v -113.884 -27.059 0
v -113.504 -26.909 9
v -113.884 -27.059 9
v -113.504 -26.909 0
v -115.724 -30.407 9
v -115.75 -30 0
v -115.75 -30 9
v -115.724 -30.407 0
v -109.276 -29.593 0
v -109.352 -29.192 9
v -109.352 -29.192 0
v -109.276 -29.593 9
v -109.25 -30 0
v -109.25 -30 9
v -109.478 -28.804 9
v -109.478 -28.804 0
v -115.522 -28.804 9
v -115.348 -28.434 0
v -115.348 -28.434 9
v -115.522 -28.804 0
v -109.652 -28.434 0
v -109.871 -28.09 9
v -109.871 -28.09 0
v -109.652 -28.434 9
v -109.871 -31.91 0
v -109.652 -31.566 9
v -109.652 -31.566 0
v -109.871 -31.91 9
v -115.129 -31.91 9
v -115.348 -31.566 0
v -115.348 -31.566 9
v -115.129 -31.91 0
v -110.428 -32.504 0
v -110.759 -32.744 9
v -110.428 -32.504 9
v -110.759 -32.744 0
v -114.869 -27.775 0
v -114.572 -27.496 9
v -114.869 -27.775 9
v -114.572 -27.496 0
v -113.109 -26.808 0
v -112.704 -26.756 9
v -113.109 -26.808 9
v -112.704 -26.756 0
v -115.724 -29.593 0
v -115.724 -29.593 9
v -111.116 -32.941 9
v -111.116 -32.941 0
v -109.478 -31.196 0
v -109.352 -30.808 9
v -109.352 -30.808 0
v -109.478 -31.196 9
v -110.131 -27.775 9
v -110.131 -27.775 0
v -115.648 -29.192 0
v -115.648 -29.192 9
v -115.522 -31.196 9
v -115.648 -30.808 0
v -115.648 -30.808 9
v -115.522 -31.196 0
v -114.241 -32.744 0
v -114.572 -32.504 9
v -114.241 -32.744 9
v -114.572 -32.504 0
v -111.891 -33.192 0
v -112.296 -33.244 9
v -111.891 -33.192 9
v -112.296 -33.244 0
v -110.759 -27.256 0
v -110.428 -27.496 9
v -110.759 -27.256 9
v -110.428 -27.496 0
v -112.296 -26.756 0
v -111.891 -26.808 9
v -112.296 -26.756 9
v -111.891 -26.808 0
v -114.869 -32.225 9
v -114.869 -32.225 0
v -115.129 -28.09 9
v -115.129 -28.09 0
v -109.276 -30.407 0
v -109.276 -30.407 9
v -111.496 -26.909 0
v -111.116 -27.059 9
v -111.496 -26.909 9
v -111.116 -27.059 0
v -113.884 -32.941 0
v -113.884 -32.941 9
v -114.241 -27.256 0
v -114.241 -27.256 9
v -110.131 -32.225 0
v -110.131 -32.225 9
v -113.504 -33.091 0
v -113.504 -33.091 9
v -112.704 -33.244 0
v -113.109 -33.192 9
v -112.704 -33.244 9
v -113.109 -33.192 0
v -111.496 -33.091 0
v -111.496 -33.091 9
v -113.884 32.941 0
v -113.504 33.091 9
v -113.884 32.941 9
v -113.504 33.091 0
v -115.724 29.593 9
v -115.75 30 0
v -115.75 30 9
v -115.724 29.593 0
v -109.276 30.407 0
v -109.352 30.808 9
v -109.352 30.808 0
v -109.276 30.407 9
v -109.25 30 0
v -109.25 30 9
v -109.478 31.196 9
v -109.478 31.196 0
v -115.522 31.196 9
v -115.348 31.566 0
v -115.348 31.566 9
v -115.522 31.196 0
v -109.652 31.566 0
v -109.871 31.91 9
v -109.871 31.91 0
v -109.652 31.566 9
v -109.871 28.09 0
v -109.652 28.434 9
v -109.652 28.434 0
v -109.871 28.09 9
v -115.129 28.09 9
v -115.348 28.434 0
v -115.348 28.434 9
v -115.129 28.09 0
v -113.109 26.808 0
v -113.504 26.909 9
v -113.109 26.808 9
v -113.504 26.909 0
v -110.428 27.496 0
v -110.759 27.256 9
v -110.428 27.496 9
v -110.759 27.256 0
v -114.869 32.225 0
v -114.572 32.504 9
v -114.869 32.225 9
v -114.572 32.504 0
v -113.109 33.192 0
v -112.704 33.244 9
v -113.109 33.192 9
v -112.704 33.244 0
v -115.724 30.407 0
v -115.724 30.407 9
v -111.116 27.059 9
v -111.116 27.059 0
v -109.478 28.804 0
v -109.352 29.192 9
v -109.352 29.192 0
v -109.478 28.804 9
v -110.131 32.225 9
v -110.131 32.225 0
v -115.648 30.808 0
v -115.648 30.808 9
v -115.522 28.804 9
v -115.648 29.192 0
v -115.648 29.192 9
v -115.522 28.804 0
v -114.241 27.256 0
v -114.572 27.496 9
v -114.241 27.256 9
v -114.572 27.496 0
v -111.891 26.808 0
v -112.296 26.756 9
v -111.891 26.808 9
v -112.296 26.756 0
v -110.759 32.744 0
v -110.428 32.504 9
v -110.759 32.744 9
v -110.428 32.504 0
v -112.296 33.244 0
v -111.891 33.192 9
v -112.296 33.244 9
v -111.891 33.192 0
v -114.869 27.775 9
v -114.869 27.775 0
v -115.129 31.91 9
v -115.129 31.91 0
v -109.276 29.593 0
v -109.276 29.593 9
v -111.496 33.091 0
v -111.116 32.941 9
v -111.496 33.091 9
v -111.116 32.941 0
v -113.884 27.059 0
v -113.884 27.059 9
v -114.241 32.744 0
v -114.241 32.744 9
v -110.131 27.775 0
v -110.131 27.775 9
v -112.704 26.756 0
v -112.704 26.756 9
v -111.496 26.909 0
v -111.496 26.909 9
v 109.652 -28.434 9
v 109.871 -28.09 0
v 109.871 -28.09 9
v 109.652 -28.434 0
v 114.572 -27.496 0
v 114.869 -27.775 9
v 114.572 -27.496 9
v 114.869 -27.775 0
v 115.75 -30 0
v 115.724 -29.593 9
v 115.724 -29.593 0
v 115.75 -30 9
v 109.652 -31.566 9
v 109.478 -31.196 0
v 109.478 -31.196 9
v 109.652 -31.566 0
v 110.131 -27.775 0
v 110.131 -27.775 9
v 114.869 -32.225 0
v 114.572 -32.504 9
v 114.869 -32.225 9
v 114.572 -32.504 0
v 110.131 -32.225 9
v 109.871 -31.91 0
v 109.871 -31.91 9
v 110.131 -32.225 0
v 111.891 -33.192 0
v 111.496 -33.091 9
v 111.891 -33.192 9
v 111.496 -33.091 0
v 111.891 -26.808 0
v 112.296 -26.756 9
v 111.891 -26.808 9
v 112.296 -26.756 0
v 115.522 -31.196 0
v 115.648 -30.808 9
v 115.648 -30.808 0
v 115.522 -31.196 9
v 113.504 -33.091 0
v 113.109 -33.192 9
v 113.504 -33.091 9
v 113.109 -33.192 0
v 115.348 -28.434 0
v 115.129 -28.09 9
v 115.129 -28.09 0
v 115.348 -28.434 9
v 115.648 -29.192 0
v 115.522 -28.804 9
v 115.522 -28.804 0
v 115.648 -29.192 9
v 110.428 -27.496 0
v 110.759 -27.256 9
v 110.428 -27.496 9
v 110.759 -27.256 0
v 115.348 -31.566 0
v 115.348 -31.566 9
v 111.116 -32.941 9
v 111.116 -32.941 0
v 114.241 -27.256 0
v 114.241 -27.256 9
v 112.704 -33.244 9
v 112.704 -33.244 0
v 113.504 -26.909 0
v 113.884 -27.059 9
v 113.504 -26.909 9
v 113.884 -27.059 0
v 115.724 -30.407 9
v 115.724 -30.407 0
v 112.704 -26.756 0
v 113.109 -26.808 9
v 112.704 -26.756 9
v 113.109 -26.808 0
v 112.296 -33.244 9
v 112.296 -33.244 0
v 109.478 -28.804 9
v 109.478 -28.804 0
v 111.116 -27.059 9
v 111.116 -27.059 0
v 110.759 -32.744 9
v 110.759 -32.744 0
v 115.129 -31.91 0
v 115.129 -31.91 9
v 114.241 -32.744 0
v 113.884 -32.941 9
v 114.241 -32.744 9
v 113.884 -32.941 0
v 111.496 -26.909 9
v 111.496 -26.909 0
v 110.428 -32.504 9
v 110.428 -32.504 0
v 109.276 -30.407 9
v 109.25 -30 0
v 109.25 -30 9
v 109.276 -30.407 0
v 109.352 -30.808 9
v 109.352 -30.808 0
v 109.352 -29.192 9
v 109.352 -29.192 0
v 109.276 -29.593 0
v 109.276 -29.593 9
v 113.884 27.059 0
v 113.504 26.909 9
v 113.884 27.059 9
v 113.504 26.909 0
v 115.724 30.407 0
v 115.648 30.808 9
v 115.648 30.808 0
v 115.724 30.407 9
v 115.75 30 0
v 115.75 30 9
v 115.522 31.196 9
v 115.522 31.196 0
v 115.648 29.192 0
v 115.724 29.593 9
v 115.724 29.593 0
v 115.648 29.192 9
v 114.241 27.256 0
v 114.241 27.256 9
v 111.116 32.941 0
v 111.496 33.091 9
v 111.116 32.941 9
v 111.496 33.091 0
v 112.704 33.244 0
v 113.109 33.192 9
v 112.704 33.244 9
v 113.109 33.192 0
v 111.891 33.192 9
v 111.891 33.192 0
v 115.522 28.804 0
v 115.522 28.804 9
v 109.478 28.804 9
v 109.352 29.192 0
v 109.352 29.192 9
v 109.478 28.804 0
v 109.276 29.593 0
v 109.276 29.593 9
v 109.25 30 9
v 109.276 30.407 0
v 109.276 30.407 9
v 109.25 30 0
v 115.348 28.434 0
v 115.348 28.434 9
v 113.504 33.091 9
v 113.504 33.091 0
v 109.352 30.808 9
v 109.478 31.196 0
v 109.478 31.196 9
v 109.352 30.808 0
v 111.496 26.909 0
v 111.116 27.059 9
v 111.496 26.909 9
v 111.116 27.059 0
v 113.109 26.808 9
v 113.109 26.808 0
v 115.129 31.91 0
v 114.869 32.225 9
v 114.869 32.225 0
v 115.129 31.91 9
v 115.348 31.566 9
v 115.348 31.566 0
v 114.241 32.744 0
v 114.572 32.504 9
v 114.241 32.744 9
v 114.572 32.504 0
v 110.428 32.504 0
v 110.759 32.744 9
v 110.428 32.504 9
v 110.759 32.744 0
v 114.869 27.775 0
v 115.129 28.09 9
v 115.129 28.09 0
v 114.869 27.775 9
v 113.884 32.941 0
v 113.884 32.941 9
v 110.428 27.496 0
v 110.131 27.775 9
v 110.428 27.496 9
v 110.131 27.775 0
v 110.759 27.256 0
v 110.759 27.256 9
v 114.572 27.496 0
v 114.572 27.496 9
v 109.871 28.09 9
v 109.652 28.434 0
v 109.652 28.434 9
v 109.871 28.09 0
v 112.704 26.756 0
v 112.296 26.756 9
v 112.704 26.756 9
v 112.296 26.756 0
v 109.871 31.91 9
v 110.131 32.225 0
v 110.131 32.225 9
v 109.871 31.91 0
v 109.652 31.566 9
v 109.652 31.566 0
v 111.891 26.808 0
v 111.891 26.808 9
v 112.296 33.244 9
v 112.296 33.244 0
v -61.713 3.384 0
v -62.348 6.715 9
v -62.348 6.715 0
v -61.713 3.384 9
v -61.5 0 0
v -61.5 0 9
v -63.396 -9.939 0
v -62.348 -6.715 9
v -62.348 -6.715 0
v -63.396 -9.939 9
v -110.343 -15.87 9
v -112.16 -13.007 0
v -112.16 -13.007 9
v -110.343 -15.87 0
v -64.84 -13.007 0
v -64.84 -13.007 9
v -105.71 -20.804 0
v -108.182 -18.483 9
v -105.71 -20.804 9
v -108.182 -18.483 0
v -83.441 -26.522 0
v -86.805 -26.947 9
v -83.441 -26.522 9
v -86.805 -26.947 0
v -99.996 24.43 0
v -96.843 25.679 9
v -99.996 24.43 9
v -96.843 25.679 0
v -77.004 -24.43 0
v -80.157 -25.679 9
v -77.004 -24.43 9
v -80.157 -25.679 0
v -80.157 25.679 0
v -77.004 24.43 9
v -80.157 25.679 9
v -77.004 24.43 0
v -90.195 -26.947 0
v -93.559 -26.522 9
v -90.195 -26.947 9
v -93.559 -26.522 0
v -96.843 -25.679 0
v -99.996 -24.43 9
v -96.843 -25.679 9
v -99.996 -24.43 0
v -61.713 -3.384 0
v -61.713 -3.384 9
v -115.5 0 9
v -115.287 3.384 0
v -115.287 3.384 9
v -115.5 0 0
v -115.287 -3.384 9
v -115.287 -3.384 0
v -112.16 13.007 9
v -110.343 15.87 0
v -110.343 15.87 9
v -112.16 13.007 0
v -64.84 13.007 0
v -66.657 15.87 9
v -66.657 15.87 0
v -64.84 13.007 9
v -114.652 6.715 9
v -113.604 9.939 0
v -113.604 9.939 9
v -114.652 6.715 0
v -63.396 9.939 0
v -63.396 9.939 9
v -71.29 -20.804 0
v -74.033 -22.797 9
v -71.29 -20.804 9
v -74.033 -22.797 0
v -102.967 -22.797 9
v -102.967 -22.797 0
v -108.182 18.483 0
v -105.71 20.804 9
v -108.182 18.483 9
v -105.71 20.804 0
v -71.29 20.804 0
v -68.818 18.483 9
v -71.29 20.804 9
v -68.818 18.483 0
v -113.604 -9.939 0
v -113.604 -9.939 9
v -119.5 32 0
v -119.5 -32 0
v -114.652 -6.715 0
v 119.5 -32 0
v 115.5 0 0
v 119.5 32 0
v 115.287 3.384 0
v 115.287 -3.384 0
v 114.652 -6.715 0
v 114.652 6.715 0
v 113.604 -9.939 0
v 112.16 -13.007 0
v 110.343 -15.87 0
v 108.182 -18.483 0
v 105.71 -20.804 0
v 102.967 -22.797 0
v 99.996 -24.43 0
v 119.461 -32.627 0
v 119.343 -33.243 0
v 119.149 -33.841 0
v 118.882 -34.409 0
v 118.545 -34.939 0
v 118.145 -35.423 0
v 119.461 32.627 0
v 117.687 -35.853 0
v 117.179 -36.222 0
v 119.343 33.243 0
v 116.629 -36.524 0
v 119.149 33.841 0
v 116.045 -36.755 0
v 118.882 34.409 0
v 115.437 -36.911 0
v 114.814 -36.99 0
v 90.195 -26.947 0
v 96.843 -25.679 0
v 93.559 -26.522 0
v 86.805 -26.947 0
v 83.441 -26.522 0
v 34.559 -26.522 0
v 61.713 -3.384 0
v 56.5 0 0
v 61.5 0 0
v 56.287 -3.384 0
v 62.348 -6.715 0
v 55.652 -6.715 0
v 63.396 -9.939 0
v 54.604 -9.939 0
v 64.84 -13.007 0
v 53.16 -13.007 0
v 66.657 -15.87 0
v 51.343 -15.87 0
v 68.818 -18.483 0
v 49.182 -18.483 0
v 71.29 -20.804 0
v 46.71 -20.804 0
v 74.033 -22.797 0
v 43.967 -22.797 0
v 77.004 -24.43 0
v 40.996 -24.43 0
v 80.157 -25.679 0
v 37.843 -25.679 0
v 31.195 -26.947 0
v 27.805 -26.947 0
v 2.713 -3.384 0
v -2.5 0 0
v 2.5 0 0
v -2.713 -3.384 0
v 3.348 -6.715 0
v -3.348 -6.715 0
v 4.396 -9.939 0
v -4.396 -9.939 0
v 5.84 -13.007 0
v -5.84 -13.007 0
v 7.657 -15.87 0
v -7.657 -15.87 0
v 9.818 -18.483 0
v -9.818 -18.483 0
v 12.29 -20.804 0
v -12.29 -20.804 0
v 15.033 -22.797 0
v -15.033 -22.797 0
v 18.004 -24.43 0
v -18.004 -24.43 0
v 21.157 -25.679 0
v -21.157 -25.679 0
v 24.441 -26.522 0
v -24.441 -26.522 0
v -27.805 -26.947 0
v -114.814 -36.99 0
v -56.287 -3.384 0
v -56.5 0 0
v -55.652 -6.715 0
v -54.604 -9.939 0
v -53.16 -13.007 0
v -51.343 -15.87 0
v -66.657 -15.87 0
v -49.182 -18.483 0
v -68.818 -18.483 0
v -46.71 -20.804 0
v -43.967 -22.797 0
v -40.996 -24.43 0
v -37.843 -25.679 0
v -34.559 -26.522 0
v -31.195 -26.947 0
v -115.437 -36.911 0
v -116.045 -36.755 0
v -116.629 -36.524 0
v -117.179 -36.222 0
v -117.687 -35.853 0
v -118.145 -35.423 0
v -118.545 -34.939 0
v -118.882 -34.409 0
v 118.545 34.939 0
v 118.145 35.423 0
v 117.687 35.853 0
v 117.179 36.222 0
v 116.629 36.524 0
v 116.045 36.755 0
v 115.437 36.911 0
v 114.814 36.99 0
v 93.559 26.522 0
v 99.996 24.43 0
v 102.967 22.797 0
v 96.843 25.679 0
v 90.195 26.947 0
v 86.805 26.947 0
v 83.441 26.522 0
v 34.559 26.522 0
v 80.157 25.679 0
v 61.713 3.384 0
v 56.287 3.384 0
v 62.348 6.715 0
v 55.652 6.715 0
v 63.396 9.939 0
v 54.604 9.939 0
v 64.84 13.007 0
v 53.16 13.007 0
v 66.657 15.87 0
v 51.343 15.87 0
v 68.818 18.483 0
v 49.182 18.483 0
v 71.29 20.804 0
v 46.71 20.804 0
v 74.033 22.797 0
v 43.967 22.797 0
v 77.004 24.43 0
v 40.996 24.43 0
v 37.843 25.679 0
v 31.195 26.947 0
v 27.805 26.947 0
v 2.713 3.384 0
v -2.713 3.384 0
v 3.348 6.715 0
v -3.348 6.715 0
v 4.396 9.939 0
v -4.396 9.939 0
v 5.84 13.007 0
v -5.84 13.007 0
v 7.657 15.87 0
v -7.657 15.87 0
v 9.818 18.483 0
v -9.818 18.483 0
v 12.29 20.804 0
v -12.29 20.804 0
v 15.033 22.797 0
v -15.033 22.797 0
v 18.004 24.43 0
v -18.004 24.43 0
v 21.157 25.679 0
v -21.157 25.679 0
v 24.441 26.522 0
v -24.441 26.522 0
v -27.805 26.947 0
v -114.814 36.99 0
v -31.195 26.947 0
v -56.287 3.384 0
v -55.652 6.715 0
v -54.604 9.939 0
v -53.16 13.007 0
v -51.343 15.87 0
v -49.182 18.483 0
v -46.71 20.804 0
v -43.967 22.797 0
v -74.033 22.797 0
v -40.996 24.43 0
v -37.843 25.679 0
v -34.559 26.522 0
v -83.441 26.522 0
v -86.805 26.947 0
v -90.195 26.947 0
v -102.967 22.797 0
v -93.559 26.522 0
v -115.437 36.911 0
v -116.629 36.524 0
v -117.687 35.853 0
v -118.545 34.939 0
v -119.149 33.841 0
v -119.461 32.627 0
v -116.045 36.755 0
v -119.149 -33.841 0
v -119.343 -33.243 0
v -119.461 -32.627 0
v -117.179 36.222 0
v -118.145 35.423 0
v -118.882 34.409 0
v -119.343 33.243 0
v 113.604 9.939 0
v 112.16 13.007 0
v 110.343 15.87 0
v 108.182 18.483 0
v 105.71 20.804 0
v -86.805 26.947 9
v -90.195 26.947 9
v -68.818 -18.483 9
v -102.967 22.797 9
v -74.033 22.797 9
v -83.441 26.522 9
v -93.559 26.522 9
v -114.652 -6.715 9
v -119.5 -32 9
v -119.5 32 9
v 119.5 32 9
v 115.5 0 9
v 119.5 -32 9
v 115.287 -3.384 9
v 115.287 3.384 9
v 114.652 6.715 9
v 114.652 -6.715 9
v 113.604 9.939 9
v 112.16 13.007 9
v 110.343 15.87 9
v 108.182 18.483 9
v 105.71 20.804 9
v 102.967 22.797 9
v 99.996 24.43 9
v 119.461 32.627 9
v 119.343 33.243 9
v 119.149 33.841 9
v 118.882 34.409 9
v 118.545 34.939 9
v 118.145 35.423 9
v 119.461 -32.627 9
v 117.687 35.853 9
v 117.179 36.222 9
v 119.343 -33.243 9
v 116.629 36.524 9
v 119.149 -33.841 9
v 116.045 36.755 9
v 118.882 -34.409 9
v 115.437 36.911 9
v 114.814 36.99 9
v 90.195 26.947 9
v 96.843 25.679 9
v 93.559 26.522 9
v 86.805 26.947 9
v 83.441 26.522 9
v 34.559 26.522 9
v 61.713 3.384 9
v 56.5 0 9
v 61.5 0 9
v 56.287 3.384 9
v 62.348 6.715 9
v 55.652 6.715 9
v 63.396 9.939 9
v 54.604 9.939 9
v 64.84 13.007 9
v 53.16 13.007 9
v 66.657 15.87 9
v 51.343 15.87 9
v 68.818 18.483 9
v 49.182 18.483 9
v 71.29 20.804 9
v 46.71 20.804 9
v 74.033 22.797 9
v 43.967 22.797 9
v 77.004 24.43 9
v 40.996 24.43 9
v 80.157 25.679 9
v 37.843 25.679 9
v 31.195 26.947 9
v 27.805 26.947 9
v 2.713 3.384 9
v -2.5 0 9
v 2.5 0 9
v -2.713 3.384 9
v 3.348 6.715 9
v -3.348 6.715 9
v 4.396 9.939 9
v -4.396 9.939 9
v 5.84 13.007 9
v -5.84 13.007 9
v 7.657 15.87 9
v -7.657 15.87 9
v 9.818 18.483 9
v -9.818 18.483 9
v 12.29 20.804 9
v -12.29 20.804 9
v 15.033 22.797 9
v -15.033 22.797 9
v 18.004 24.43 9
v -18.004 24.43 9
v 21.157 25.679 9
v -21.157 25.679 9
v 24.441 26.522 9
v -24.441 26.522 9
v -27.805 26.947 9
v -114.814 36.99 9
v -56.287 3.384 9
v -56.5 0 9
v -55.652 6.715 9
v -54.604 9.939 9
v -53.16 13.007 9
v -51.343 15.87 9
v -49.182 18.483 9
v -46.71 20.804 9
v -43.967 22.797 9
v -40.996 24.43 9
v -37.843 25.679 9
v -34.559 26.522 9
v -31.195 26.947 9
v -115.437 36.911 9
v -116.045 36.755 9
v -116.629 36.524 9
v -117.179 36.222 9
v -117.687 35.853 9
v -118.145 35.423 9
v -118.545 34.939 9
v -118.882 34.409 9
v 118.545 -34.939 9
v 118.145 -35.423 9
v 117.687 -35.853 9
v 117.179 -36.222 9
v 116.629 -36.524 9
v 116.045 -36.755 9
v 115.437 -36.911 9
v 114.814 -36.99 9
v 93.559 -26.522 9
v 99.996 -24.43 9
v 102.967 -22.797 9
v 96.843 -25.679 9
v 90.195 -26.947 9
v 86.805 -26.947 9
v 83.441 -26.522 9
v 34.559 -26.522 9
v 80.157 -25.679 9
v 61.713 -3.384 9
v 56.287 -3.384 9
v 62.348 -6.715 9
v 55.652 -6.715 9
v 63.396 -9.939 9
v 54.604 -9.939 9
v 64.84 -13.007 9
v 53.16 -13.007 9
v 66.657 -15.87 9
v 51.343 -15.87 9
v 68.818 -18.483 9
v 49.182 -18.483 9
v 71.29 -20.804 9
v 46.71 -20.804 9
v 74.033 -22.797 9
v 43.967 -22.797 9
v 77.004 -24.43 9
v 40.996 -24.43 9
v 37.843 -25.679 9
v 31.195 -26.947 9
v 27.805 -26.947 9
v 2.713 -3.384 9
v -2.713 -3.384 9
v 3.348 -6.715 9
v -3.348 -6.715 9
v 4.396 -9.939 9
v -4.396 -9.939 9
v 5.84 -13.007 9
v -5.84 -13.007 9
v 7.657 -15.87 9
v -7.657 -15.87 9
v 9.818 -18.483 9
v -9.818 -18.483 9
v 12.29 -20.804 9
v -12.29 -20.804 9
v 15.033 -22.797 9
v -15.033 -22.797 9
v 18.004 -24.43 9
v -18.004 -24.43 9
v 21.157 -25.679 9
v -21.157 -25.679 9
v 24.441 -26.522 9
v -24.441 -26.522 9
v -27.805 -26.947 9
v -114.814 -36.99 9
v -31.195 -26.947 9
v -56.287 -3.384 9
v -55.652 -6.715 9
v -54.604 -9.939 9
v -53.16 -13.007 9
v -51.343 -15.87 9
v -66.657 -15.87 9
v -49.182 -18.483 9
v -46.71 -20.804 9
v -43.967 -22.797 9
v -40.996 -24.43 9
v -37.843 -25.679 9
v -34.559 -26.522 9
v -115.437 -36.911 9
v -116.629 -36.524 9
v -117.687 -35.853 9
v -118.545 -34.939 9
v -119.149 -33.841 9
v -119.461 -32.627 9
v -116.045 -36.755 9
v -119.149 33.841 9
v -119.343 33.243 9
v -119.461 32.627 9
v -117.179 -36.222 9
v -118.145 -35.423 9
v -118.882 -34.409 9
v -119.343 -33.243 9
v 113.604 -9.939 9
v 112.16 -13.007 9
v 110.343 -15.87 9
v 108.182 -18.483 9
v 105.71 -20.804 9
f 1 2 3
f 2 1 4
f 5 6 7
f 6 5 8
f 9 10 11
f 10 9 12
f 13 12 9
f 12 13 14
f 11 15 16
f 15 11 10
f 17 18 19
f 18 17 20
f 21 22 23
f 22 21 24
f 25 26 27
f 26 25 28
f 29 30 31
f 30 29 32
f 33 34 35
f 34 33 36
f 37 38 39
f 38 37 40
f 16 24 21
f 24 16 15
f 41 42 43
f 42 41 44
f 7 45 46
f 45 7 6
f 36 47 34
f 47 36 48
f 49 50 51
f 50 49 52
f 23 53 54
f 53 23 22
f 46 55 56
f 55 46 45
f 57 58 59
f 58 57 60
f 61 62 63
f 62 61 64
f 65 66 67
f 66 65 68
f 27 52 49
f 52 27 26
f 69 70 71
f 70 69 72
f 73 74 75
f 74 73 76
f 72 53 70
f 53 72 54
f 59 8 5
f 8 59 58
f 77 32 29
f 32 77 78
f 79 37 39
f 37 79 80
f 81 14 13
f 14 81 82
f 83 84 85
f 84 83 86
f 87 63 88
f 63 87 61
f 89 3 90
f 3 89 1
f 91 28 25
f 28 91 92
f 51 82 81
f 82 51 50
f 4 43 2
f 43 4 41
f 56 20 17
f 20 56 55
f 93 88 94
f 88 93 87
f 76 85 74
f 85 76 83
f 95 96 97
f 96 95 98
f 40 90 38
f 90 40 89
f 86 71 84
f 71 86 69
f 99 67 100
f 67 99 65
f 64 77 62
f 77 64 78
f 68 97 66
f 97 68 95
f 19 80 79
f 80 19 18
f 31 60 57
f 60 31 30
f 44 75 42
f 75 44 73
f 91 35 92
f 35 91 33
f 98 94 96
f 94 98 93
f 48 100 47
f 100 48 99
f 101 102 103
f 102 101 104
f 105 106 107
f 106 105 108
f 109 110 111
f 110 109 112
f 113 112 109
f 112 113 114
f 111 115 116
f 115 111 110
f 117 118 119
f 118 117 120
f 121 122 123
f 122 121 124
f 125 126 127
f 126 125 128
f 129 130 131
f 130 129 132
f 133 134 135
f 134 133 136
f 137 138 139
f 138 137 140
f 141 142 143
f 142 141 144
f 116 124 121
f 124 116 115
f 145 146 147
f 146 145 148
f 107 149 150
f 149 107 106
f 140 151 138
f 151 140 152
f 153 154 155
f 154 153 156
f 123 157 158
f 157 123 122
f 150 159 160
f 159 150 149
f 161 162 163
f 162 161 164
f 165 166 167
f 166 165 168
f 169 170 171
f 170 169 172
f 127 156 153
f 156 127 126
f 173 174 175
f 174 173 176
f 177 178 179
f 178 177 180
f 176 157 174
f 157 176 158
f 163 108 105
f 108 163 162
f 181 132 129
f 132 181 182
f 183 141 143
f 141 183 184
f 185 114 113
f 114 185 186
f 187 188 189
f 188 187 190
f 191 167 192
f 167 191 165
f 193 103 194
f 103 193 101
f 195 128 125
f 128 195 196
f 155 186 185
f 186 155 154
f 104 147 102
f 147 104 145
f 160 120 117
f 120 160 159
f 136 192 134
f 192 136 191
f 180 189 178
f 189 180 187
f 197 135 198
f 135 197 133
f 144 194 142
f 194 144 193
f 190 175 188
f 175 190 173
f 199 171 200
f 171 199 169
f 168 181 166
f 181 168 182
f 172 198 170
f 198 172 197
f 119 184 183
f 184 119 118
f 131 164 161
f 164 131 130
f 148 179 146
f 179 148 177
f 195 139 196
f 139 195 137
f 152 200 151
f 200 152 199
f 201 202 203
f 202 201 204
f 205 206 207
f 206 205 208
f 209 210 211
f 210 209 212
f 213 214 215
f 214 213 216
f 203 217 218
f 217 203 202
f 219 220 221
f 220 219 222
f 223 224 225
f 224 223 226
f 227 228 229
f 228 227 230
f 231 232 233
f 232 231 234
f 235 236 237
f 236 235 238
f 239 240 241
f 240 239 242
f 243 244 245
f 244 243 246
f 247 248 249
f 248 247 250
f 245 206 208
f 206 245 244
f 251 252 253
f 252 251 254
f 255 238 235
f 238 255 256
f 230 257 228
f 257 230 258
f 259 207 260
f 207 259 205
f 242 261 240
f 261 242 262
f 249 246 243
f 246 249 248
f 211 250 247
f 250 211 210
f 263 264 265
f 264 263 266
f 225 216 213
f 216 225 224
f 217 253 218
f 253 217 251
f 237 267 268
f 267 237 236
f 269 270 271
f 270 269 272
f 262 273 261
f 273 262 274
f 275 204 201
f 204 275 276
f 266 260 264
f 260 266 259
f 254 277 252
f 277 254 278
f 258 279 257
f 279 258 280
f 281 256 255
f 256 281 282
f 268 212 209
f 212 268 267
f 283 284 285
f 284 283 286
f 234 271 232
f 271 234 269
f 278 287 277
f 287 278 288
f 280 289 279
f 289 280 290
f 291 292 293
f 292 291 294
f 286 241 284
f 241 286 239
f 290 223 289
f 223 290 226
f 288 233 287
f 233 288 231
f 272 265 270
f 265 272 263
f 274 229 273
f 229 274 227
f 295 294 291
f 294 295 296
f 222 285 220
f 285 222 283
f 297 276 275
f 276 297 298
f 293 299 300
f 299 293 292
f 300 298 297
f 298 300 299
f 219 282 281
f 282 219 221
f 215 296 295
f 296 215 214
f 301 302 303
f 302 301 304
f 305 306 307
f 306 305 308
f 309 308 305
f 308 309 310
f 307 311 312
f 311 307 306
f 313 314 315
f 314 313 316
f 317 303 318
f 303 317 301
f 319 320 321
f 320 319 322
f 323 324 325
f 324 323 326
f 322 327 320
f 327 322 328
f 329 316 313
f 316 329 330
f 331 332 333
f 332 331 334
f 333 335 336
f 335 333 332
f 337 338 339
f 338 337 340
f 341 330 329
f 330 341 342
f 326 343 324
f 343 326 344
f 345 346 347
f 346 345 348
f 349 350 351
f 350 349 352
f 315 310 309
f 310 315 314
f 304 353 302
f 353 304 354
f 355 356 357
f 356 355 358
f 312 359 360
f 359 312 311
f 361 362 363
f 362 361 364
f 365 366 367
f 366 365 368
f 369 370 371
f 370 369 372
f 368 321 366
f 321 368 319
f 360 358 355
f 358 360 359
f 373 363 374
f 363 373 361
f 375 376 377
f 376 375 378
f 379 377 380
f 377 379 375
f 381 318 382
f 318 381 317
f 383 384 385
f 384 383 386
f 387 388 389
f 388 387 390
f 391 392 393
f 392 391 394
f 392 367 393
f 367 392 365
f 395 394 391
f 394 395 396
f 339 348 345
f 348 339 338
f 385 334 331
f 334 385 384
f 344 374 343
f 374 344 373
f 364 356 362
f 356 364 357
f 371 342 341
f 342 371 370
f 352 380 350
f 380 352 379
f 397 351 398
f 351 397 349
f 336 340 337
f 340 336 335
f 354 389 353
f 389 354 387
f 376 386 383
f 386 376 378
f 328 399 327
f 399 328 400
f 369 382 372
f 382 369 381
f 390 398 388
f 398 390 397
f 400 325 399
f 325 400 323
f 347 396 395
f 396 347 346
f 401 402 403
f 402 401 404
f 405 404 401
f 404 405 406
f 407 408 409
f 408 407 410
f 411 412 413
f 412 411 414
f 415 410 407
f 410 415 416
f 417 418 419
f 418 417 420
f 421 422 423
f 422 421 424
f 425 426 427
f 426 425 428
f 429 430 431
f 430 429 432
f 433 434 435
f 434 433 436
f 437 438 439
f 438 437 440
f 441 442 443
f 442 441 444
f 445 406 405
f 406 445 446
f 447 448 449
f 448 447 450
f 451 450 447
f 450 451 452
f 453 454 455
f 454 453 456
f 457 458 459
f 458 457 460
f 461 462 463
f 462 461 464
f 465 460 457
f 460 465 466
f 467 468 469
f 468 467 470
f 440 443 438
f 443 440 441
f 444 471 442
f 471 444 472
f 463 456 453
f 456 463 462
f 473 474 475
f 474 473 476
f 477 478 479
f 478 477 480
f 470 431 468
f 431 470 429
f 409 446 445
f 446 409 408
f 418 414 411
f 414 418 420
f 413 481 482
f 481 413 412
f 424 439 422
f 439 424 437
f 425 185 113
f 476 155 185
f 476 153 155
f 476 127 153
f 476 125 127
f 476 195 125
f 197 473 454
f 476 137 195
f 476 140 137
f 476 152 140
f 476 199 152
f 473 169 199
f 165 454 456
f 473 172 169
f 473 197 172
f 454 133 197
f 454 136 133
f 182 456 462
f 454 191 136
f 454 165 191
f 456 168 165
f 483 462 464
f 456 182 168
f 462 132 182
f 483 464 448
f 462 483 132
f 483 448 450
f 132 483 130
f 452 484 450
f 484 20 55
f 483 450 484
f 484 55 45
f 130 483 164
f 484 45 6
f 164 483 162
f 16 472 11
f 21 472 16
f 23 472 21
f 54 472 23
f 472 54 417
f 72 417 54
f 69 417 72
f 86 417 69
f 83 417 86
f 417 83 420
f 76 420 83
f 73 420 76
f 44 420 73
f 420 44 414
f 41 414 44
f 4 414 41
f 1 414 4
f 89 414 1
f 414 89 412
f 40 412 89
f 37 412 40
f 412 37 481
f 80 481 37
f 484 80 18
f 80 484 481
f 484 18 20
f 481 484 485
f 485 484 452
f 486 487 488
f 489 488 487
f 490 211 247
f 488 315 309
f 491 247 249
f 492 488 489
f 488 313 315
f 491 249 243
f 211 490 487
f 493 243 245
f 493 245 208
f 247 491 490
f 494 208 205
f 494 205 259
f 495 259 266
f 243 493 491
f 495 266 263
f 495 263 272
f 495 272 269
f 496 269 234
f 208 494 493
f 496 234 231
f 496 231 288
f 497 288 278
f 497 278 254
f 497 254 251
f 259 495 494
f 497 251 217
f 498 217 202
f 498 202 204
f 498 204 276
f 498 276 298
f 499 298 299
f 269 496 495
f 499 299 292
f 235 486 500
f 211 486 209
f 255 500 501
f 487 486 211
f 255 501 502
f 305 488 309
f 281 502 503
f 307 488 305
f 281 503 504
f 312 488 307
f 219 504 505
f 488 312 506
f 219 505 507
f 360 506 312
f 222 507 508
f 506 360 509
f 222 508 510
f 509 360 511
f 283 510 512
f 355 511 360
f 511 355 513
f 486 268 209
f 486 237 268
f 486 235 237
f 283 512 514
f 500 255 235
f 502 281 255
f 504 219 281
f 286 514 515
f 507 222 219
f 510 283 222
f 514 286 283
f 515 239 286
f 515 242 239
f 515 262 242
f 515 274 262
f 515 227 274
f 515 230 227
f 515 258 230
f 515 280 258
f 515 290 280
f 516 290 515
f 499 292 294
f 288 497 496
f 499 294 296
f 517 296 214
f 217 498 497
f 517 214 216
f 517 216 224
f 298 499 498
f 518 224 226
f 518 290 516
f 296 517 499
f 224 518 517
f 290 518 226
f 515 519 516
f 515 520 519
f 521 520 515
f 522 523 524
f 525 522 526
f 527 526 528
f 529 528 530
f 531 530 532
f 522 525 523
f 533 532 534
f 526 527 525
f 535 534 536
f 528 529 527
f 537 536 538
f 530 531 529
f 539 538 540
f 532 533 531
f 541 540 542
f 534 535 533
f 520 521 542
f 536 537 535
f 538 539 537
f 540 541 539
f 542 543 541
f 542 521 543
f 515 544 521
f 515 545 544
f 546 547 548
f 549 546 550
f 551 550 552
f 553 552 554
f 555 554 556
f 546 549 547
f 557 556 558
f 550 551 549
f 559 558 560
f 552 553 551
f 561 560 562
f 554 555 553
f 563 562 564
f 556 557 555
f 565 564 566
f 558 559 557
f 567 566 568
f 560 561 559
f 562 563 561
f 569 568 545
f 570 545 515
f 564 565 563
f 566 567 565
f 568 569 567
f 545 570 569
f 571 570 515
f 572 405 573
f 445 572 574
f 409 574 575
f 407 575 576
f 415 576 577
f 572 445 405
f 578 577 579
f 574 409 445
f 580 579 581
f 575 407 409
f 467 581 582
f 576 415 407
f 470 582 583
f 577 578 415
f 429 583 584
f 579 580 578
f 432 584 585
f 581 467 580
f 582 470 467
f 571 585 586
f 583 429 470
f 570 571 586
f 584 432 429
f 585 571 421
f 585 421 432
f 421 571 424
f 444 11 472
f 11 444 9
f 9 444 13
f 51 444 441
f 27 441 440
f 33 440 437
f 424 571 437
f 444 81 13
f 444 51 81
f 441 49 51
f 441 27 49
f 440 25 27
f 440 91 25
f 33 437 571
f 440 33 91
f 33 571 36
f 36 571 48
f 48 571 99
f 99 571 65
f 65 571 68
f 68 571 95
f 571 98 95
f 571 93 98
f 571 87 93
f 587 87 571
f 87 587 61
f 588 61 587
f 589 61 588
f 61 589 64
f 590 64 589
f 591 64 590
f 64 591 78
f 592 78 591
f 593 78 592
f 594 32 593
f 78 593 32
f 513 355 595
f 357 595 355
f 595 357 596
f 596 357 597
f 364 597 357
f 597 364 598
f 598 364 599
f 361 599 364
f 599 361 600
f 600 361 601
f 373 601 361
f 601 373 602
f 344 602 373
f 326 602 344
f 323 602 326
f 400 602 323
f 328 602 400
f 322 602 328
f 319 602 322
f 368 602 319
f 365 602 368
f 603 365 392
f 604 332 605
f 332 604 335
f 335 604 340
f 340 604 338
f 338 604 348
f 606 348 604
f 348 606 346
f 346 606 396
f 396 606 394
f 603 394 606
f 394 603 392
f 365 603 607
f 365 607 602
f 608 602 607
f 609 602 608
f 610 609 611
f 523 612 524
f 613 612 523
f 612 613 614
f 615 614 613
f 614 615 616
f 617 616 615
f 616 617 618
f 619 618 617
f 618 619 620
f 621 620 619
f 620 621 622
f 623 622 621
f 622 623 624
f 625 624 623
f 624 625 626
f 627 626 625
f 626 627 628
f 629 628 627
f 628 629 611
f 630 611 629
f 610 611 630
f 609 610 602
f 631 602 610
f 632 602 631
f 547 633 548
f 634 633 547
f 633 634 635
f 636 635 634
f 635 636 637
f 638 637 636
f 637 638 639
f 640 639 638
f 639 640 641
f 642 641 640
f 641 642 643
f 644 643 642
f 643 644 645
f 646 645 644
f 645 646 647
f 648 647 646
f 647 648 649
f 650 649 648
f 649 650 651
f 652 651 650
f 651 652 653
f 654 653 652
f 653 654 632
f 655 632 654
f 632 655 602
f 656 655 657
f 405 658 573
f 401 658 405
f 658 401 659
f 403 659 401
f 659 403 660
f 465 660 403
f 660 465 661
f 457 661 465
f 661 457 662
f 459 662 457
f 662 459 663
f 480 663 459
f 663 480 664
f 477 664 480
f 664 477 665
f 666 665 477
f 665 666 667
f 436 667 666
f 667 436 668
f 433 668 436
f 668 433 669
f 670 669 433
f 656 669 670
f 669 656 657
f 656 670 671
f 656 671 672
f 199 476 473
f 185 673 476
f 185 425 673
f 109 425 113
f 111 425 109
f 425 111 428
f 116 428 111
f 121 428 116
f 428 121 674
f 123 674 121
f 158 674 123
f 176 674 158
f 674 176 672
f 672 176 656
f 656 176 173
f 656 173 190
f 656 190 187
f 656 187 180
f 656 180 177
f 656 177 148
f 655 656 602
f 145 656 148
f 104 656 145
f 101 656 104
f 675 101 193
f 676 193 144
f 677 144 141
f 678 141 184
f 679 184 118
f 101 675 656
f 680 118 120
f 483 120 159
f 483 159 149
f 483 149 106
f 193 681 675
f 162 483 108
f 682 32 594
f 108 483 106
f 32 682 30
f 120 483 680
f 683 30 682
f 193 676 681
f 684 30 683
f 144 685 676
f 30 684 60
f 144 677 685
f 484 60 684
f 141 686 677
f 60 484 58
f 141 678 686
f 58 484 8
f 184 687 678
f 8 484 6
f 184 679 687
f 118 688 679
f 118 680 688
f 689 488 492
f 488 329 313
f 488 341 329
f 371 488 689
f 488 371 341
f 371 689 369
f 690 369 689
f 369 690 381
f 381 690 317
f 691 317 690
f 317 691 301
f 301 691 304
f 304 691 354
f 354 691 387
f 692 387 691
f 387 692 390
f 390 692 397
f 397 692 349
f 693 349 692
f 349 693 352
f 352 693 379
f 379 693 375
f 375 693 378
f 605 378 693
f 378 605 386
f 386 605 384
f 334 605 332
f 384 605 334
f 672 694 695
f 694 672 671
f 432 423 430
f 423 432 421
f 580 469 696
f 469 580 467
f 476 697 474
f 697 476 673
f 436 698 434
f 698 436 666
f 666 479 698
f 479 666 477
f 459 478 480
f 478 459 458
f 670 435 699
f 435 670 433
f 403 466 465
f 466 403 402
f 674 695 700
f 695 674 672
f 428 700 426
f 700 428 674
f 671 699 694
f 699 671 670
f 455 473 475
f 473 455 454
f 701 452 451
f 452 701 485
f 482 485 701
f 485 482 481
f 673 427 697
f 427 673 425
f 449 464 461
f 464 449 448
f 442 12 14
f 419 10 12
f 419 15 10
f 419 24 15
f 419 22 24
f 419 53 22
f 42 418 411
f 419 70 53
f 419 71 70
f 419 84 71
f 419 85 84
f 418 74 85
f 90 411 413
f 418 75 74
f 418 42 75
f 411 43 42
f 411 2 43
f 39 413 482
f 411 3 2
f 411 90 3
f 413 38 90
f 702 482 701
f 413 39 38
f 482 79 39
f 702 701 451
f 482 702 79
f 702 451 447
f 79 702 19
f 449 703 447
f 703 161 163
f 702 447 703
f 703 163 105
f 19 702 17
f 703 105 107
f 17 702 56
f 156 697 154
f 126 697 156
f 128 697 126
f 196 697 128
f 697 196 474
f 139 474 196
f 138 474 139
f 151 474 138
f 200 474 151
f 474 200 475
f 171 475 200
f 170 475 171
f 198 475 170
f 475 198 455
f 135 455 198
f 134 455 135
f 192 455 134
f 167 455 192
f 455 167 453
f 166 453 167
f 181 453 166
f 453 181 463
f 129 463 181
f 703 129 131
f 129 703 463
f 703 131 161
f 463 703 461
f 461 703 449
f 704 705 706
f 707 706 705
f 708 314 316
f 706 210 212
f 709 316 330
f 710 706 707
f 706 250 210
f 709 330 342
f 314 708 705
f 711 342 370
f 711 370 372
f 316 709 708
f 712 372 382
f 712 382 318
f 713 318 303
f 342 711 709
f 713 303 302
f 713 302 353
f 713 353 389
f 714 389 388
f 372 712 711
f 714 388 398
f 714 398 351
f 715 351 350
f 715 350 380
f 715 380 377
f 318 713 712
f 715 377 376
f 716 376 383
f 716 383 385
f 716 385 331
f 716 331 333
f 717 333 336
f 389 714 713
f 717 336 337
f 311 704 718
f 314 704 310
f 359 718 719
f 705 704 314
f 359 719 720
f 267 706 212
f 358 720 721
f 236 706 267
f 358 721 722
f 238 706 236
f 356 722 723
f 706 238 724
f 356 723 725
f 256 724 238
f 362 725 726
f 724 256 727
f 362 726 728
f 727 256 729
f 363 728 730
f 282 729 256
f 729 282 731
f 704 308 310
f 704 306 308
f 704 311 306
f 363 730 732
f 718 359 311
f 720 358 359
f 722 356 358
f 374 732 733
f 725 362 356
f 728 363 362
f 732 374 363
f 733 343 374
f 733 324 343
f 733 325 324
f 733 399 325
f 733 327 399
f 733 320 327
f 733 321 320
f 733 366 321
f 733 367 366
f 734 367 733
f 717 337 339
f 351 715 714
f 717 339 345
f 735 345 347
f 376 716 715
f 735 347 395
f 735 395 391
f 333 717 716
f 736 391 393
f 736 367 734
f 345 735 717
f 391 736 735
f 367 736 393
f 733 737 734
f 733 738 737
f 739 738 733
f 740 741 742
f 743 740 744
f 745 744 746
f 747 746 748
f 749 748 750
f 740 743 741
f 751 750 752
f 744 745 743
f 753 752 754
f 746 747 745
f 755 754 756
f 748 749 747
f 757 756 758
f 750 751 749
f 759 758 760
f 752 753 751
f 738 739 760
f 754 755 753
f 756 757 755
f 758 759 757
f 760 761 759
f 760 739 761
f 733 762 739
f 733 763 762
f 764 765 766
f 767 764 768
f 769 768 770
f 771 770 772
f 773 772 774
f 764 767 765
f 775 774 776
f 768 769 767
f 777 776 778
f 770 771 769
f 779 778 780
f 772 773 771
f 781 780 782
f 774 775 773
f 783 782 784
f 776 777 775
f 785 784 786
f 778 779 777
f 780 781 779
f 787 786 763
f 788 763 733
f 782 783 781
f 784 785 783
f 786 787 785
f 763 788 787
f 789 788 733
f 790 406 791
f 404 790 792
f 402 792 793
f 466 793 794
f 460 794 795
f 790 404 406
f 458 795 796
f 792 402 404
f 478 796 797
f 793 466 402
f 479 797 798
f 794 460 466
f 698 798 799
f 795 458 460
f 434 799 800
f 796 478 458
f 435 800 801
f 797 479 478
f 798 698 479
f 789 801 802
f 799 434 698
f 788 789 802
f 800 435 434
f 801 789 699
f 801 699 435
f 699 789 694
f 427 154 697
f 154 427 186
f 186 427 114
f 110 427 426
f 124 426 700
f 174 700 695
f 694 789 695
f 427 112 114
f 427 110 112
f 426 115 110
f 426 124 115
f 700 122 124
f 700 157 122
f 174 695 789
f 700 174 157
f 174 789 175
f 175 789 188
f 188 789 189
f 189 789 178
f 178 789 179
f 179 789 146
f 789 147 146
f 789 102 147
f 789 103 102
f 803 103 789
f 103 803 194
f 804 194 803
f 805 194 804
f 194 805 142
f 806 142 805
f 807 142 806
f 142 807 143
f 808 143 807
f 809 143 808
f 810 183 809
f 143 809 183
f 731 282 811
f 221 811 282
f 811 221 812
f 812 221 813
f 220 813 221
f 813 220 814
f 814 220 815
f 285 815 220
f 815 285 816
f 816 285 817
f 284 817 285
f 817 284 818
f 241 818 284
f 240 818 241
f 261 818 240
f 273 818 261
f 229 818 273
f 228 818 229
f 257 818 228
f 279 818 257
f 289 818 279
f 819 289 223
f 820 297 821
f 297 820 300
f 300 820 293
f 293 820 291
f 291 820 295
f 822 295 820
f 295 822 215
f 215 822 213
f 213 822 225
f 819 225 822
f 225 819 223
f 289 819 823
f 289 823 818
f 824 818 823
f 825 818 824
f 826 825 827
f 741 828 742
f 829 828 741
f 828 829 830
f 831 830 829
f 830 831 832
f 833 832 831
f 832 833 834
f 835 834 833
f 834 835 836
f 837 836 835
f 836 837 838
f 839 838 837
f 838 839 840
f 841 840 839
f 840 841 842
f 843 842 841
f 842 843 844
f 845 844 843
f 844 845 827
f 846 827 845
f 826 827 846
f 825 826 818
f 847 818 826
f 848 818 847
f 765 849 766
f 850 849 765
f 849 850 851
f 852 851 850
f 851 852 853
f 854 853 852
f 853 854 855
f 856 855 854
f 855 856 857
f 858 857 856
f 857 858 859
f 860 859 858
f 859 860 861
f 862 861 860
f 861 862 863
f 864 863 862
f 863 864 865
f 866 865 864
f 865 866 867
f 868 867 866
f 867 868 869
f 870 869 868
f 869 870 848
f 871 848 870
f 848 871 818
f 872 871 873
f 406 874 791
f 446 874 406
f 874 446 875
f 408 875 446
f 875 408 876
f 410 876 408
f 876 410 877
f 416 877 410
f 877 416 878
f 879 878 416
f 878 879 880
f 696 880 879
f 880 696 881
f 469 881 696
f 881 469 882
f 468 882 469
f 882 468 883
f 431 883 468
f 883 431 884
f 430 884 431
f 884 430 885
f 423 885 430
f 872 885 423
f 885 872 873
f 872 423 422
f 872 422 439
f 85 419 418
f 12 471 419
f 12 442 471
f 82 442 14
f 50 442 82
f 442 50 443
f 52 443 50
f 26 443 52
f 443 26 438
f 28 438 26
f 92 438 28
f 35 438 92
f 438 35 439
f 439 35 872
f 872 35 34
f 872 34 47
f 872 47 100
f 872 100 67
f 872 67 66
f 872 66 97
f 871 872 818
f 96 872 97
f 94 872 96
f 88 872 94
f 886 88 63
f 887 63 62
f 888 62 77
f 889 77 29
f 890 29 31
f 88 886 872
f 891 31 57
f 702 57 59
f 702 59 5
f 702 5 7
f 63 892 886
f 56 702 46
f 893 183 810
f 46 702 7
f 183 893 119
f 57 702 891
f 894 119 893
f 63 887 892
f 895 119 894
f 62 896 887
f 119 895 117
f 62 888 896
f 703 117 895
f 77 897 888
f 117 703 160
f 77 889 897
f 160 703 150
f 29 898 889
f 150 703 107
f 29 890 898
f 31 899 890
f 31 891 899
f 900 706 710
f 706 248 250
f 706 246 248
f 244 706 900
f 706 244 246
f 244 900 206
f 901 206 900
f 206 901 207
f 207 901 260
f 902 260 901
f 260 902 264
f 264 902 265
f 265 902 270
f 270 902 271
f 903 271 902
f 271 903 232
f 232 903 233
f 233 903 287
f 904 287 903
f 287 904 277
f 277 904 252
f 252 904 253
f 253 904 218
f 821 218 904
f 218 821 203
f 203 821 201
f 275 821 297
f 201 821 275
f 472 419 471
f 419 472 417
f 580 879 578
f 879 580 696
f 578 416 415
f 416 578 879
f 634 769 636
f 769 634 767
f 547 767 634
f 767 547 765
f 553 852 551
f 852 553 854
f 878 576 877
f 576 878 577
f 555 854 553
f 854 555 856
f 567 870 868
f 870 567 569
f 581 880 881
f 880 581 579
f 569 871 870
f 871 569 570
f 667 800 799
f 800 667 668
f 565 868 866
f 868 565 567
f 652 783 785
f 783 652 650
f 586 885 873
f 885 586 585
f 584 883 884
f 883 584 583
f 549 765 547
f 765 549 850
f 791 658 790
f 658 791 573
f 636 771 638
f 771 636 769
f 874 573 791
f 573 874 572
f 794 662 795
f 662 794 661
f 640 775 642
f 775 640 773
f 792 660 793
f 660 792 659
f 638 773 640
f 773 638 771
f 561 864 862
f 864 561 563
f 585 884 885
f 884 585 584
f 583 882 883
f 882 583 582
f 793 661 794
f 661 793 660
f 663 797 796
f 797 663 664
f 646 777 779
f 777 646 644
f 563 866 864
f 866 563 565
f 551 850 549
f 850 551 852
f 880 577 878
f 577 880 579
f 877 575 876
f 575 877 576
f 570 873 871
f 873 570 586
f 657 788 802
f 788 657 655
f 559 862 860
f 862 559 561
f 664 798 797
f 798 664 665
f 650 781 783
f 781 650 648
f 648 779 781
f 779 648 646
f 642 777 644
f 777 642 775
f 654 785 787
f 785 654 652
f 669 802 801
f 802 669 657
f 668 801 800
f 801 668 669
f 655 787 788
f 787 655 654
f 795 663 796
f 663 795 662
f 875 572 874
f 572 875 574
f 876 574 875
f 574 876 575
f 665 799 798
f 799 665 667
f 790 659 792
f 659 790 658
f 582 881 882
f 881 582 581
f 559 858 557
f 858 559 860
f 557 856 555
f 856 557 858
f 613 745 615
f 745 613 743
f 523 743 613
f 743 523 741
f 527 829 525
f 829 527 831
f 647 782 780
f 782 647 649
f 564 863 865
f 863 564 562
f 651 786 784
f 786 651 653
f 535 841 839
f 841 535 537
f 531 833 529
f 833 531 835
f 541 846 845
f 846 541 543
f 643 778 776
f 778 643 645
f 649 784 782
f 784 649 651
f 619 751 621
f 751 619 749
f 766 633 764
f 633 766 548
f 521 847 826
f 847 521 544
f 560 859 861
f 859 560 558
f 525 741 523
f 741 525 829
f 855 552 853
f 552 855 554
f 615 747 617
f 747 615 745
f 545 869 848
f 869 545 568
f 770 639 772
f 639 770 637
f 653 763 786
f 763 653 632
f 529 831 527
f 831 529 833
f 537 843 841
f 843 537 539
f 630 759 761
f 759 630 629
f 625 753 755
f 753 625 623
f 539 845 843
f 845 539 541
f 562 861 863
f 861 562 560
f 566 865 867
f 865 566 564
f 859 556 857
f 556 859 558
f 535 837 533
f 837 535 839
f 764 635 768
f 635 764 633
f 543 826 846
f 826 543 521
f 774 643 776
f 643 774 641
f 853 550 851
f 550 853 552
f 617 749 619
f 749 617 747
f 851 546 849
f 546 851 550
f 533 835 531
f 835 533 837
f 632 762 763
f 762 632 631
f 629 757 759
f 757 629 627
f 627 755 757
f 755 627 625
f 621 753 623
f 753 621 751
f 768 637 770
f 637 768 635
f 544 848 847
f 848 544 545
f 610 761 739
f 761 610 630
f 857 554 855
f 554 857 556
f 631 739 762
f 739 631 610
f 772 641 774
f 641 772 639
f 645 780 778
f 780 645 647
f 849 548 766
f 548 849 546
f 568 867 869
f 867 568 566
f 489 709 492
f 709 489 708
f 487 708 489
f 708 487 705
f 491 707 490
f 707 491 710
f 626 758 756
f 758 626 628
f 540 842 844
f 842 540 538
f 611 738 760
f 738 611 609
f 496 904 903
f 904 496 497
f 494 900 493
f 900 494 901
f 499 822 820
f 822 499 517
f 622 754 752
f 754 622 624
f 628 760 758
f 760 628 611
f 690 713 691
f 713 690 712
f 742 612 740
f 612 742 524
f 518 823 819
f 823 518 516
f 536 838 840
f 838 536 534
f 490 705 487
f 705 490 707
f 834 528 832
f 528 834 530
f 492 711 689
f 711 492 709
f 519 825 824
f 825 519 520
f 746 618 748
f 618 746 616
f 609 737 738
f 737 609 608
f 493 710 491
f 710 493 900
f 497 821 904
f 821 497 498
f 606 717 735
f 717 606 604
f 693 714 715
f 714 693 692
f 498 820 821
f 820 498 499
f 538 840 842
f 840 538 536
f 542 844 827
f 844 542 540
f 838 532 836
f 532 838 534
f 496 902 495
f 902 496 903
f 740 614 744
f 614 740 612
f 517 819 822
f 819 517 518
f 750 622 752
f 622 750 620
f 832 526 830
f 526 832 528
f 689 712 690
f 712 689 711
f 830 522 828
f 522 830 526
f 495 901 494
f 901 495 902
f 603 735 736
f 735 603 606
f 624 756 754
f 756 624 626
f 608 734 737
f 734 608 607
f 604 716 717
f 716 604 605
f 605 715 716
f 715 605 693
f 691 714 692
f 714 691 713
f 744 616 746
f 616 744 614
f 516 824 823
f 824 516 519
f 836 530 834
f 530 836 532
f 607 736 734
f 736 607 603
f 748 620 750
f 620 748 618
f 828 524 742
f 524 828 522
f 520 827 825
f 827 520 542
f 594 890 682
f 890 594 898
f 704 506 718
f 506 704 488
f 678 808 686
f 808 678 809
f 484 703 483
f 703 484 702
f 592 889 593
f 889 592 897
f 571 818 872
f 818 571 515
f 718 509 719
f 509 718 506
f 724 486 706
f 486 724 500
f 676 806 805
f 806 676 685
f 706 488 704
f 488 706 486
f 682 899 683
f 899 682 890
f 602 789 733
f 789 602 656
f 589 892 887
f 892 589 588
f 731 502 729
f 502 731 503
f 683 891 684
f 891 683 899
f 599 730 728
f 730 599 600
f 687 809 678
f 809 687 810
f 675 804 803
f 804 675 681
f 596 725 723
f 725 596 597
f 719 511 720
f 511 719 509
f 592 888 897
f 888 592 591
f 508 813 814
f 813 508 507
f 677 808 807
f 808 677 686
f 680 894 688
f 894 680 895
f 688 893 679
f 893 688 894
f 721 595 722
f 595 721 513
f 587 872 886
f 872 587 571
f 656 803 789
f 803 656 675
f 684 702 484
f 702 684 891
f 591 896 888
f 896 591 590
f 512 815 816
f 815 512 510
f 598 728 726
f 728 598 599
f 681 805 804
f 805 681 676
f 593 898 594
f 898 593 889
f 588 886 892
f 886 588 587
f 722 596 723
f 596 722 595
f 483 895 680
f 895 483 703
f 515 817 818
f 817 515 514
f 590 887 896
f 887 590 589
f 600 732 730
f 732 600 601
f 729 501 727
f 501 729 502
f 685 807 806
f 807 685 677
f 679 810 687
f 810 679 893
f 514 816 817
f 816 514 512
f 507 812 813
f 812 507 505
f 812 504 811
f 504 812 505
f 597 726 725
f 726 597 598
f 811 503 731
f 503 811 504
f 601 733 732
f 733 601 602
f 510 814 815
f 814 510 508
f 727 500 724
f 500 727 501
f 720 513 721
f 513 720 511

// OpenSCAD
$fn = 50;


difference() {
	union() {
		hull() {
			translate(v = [-114.5000000000, 32.0000000000, 0]) {
				cylinder(h = 9, r = 5);
			}
			translate(v = [114.5000000000, 32.0000000000, 0]) {
				cylinder(h = 9, r = 5);
			}
			translate(v = [-114.5000000000, -32.0000000000, 0]) {
				cylinder(h = 9, r = 5);
			}
			translate(v = [114.5000000000, -32.0000000000, 0]) {
				cylinder(h = 9, r = 5);
			}
		}
	}
	union() {
		#translate(v = [-112.5000000000, -30.0000000000, -100.0000000000]) {
			cylinder(h = 200, r = 3.2500000000);
		}
		#translate(v = [-112.5000000000, 30.0000000000, -100.0000000000]) {
			cylinder(h = 200, r = 3.2500000000);
		}
		#translate(v = [112.5000000000, -30.0000000000, -100.0000000000]) {
			cylinder(h = 200, r = 3.2500000000);
		}
		#translate(v = [112.5000000000, 30.0000000000, -100.0000000000]) {
			cylinder(h = 200, r = 3.2500000000);
		}
		#translate(v = [-88.5000000000, 0, 0]) {
			cylinder(h = 9, r = 27.0000000000);
		}
		#translate(v = [-29.5000000000, 0, 0]) {
			cylinder(h = 9, r = 27.0000000000);
		}
		#translate(v = [29.5000000000, 0, 0]) {
			cylinder(h = 9, r = 27.0000000000);
		}
		#translate(v = [88.5000000000, 0, 0]) {
			cylinder(h = 9, r = 27.0000000000);
		}
	}
}
